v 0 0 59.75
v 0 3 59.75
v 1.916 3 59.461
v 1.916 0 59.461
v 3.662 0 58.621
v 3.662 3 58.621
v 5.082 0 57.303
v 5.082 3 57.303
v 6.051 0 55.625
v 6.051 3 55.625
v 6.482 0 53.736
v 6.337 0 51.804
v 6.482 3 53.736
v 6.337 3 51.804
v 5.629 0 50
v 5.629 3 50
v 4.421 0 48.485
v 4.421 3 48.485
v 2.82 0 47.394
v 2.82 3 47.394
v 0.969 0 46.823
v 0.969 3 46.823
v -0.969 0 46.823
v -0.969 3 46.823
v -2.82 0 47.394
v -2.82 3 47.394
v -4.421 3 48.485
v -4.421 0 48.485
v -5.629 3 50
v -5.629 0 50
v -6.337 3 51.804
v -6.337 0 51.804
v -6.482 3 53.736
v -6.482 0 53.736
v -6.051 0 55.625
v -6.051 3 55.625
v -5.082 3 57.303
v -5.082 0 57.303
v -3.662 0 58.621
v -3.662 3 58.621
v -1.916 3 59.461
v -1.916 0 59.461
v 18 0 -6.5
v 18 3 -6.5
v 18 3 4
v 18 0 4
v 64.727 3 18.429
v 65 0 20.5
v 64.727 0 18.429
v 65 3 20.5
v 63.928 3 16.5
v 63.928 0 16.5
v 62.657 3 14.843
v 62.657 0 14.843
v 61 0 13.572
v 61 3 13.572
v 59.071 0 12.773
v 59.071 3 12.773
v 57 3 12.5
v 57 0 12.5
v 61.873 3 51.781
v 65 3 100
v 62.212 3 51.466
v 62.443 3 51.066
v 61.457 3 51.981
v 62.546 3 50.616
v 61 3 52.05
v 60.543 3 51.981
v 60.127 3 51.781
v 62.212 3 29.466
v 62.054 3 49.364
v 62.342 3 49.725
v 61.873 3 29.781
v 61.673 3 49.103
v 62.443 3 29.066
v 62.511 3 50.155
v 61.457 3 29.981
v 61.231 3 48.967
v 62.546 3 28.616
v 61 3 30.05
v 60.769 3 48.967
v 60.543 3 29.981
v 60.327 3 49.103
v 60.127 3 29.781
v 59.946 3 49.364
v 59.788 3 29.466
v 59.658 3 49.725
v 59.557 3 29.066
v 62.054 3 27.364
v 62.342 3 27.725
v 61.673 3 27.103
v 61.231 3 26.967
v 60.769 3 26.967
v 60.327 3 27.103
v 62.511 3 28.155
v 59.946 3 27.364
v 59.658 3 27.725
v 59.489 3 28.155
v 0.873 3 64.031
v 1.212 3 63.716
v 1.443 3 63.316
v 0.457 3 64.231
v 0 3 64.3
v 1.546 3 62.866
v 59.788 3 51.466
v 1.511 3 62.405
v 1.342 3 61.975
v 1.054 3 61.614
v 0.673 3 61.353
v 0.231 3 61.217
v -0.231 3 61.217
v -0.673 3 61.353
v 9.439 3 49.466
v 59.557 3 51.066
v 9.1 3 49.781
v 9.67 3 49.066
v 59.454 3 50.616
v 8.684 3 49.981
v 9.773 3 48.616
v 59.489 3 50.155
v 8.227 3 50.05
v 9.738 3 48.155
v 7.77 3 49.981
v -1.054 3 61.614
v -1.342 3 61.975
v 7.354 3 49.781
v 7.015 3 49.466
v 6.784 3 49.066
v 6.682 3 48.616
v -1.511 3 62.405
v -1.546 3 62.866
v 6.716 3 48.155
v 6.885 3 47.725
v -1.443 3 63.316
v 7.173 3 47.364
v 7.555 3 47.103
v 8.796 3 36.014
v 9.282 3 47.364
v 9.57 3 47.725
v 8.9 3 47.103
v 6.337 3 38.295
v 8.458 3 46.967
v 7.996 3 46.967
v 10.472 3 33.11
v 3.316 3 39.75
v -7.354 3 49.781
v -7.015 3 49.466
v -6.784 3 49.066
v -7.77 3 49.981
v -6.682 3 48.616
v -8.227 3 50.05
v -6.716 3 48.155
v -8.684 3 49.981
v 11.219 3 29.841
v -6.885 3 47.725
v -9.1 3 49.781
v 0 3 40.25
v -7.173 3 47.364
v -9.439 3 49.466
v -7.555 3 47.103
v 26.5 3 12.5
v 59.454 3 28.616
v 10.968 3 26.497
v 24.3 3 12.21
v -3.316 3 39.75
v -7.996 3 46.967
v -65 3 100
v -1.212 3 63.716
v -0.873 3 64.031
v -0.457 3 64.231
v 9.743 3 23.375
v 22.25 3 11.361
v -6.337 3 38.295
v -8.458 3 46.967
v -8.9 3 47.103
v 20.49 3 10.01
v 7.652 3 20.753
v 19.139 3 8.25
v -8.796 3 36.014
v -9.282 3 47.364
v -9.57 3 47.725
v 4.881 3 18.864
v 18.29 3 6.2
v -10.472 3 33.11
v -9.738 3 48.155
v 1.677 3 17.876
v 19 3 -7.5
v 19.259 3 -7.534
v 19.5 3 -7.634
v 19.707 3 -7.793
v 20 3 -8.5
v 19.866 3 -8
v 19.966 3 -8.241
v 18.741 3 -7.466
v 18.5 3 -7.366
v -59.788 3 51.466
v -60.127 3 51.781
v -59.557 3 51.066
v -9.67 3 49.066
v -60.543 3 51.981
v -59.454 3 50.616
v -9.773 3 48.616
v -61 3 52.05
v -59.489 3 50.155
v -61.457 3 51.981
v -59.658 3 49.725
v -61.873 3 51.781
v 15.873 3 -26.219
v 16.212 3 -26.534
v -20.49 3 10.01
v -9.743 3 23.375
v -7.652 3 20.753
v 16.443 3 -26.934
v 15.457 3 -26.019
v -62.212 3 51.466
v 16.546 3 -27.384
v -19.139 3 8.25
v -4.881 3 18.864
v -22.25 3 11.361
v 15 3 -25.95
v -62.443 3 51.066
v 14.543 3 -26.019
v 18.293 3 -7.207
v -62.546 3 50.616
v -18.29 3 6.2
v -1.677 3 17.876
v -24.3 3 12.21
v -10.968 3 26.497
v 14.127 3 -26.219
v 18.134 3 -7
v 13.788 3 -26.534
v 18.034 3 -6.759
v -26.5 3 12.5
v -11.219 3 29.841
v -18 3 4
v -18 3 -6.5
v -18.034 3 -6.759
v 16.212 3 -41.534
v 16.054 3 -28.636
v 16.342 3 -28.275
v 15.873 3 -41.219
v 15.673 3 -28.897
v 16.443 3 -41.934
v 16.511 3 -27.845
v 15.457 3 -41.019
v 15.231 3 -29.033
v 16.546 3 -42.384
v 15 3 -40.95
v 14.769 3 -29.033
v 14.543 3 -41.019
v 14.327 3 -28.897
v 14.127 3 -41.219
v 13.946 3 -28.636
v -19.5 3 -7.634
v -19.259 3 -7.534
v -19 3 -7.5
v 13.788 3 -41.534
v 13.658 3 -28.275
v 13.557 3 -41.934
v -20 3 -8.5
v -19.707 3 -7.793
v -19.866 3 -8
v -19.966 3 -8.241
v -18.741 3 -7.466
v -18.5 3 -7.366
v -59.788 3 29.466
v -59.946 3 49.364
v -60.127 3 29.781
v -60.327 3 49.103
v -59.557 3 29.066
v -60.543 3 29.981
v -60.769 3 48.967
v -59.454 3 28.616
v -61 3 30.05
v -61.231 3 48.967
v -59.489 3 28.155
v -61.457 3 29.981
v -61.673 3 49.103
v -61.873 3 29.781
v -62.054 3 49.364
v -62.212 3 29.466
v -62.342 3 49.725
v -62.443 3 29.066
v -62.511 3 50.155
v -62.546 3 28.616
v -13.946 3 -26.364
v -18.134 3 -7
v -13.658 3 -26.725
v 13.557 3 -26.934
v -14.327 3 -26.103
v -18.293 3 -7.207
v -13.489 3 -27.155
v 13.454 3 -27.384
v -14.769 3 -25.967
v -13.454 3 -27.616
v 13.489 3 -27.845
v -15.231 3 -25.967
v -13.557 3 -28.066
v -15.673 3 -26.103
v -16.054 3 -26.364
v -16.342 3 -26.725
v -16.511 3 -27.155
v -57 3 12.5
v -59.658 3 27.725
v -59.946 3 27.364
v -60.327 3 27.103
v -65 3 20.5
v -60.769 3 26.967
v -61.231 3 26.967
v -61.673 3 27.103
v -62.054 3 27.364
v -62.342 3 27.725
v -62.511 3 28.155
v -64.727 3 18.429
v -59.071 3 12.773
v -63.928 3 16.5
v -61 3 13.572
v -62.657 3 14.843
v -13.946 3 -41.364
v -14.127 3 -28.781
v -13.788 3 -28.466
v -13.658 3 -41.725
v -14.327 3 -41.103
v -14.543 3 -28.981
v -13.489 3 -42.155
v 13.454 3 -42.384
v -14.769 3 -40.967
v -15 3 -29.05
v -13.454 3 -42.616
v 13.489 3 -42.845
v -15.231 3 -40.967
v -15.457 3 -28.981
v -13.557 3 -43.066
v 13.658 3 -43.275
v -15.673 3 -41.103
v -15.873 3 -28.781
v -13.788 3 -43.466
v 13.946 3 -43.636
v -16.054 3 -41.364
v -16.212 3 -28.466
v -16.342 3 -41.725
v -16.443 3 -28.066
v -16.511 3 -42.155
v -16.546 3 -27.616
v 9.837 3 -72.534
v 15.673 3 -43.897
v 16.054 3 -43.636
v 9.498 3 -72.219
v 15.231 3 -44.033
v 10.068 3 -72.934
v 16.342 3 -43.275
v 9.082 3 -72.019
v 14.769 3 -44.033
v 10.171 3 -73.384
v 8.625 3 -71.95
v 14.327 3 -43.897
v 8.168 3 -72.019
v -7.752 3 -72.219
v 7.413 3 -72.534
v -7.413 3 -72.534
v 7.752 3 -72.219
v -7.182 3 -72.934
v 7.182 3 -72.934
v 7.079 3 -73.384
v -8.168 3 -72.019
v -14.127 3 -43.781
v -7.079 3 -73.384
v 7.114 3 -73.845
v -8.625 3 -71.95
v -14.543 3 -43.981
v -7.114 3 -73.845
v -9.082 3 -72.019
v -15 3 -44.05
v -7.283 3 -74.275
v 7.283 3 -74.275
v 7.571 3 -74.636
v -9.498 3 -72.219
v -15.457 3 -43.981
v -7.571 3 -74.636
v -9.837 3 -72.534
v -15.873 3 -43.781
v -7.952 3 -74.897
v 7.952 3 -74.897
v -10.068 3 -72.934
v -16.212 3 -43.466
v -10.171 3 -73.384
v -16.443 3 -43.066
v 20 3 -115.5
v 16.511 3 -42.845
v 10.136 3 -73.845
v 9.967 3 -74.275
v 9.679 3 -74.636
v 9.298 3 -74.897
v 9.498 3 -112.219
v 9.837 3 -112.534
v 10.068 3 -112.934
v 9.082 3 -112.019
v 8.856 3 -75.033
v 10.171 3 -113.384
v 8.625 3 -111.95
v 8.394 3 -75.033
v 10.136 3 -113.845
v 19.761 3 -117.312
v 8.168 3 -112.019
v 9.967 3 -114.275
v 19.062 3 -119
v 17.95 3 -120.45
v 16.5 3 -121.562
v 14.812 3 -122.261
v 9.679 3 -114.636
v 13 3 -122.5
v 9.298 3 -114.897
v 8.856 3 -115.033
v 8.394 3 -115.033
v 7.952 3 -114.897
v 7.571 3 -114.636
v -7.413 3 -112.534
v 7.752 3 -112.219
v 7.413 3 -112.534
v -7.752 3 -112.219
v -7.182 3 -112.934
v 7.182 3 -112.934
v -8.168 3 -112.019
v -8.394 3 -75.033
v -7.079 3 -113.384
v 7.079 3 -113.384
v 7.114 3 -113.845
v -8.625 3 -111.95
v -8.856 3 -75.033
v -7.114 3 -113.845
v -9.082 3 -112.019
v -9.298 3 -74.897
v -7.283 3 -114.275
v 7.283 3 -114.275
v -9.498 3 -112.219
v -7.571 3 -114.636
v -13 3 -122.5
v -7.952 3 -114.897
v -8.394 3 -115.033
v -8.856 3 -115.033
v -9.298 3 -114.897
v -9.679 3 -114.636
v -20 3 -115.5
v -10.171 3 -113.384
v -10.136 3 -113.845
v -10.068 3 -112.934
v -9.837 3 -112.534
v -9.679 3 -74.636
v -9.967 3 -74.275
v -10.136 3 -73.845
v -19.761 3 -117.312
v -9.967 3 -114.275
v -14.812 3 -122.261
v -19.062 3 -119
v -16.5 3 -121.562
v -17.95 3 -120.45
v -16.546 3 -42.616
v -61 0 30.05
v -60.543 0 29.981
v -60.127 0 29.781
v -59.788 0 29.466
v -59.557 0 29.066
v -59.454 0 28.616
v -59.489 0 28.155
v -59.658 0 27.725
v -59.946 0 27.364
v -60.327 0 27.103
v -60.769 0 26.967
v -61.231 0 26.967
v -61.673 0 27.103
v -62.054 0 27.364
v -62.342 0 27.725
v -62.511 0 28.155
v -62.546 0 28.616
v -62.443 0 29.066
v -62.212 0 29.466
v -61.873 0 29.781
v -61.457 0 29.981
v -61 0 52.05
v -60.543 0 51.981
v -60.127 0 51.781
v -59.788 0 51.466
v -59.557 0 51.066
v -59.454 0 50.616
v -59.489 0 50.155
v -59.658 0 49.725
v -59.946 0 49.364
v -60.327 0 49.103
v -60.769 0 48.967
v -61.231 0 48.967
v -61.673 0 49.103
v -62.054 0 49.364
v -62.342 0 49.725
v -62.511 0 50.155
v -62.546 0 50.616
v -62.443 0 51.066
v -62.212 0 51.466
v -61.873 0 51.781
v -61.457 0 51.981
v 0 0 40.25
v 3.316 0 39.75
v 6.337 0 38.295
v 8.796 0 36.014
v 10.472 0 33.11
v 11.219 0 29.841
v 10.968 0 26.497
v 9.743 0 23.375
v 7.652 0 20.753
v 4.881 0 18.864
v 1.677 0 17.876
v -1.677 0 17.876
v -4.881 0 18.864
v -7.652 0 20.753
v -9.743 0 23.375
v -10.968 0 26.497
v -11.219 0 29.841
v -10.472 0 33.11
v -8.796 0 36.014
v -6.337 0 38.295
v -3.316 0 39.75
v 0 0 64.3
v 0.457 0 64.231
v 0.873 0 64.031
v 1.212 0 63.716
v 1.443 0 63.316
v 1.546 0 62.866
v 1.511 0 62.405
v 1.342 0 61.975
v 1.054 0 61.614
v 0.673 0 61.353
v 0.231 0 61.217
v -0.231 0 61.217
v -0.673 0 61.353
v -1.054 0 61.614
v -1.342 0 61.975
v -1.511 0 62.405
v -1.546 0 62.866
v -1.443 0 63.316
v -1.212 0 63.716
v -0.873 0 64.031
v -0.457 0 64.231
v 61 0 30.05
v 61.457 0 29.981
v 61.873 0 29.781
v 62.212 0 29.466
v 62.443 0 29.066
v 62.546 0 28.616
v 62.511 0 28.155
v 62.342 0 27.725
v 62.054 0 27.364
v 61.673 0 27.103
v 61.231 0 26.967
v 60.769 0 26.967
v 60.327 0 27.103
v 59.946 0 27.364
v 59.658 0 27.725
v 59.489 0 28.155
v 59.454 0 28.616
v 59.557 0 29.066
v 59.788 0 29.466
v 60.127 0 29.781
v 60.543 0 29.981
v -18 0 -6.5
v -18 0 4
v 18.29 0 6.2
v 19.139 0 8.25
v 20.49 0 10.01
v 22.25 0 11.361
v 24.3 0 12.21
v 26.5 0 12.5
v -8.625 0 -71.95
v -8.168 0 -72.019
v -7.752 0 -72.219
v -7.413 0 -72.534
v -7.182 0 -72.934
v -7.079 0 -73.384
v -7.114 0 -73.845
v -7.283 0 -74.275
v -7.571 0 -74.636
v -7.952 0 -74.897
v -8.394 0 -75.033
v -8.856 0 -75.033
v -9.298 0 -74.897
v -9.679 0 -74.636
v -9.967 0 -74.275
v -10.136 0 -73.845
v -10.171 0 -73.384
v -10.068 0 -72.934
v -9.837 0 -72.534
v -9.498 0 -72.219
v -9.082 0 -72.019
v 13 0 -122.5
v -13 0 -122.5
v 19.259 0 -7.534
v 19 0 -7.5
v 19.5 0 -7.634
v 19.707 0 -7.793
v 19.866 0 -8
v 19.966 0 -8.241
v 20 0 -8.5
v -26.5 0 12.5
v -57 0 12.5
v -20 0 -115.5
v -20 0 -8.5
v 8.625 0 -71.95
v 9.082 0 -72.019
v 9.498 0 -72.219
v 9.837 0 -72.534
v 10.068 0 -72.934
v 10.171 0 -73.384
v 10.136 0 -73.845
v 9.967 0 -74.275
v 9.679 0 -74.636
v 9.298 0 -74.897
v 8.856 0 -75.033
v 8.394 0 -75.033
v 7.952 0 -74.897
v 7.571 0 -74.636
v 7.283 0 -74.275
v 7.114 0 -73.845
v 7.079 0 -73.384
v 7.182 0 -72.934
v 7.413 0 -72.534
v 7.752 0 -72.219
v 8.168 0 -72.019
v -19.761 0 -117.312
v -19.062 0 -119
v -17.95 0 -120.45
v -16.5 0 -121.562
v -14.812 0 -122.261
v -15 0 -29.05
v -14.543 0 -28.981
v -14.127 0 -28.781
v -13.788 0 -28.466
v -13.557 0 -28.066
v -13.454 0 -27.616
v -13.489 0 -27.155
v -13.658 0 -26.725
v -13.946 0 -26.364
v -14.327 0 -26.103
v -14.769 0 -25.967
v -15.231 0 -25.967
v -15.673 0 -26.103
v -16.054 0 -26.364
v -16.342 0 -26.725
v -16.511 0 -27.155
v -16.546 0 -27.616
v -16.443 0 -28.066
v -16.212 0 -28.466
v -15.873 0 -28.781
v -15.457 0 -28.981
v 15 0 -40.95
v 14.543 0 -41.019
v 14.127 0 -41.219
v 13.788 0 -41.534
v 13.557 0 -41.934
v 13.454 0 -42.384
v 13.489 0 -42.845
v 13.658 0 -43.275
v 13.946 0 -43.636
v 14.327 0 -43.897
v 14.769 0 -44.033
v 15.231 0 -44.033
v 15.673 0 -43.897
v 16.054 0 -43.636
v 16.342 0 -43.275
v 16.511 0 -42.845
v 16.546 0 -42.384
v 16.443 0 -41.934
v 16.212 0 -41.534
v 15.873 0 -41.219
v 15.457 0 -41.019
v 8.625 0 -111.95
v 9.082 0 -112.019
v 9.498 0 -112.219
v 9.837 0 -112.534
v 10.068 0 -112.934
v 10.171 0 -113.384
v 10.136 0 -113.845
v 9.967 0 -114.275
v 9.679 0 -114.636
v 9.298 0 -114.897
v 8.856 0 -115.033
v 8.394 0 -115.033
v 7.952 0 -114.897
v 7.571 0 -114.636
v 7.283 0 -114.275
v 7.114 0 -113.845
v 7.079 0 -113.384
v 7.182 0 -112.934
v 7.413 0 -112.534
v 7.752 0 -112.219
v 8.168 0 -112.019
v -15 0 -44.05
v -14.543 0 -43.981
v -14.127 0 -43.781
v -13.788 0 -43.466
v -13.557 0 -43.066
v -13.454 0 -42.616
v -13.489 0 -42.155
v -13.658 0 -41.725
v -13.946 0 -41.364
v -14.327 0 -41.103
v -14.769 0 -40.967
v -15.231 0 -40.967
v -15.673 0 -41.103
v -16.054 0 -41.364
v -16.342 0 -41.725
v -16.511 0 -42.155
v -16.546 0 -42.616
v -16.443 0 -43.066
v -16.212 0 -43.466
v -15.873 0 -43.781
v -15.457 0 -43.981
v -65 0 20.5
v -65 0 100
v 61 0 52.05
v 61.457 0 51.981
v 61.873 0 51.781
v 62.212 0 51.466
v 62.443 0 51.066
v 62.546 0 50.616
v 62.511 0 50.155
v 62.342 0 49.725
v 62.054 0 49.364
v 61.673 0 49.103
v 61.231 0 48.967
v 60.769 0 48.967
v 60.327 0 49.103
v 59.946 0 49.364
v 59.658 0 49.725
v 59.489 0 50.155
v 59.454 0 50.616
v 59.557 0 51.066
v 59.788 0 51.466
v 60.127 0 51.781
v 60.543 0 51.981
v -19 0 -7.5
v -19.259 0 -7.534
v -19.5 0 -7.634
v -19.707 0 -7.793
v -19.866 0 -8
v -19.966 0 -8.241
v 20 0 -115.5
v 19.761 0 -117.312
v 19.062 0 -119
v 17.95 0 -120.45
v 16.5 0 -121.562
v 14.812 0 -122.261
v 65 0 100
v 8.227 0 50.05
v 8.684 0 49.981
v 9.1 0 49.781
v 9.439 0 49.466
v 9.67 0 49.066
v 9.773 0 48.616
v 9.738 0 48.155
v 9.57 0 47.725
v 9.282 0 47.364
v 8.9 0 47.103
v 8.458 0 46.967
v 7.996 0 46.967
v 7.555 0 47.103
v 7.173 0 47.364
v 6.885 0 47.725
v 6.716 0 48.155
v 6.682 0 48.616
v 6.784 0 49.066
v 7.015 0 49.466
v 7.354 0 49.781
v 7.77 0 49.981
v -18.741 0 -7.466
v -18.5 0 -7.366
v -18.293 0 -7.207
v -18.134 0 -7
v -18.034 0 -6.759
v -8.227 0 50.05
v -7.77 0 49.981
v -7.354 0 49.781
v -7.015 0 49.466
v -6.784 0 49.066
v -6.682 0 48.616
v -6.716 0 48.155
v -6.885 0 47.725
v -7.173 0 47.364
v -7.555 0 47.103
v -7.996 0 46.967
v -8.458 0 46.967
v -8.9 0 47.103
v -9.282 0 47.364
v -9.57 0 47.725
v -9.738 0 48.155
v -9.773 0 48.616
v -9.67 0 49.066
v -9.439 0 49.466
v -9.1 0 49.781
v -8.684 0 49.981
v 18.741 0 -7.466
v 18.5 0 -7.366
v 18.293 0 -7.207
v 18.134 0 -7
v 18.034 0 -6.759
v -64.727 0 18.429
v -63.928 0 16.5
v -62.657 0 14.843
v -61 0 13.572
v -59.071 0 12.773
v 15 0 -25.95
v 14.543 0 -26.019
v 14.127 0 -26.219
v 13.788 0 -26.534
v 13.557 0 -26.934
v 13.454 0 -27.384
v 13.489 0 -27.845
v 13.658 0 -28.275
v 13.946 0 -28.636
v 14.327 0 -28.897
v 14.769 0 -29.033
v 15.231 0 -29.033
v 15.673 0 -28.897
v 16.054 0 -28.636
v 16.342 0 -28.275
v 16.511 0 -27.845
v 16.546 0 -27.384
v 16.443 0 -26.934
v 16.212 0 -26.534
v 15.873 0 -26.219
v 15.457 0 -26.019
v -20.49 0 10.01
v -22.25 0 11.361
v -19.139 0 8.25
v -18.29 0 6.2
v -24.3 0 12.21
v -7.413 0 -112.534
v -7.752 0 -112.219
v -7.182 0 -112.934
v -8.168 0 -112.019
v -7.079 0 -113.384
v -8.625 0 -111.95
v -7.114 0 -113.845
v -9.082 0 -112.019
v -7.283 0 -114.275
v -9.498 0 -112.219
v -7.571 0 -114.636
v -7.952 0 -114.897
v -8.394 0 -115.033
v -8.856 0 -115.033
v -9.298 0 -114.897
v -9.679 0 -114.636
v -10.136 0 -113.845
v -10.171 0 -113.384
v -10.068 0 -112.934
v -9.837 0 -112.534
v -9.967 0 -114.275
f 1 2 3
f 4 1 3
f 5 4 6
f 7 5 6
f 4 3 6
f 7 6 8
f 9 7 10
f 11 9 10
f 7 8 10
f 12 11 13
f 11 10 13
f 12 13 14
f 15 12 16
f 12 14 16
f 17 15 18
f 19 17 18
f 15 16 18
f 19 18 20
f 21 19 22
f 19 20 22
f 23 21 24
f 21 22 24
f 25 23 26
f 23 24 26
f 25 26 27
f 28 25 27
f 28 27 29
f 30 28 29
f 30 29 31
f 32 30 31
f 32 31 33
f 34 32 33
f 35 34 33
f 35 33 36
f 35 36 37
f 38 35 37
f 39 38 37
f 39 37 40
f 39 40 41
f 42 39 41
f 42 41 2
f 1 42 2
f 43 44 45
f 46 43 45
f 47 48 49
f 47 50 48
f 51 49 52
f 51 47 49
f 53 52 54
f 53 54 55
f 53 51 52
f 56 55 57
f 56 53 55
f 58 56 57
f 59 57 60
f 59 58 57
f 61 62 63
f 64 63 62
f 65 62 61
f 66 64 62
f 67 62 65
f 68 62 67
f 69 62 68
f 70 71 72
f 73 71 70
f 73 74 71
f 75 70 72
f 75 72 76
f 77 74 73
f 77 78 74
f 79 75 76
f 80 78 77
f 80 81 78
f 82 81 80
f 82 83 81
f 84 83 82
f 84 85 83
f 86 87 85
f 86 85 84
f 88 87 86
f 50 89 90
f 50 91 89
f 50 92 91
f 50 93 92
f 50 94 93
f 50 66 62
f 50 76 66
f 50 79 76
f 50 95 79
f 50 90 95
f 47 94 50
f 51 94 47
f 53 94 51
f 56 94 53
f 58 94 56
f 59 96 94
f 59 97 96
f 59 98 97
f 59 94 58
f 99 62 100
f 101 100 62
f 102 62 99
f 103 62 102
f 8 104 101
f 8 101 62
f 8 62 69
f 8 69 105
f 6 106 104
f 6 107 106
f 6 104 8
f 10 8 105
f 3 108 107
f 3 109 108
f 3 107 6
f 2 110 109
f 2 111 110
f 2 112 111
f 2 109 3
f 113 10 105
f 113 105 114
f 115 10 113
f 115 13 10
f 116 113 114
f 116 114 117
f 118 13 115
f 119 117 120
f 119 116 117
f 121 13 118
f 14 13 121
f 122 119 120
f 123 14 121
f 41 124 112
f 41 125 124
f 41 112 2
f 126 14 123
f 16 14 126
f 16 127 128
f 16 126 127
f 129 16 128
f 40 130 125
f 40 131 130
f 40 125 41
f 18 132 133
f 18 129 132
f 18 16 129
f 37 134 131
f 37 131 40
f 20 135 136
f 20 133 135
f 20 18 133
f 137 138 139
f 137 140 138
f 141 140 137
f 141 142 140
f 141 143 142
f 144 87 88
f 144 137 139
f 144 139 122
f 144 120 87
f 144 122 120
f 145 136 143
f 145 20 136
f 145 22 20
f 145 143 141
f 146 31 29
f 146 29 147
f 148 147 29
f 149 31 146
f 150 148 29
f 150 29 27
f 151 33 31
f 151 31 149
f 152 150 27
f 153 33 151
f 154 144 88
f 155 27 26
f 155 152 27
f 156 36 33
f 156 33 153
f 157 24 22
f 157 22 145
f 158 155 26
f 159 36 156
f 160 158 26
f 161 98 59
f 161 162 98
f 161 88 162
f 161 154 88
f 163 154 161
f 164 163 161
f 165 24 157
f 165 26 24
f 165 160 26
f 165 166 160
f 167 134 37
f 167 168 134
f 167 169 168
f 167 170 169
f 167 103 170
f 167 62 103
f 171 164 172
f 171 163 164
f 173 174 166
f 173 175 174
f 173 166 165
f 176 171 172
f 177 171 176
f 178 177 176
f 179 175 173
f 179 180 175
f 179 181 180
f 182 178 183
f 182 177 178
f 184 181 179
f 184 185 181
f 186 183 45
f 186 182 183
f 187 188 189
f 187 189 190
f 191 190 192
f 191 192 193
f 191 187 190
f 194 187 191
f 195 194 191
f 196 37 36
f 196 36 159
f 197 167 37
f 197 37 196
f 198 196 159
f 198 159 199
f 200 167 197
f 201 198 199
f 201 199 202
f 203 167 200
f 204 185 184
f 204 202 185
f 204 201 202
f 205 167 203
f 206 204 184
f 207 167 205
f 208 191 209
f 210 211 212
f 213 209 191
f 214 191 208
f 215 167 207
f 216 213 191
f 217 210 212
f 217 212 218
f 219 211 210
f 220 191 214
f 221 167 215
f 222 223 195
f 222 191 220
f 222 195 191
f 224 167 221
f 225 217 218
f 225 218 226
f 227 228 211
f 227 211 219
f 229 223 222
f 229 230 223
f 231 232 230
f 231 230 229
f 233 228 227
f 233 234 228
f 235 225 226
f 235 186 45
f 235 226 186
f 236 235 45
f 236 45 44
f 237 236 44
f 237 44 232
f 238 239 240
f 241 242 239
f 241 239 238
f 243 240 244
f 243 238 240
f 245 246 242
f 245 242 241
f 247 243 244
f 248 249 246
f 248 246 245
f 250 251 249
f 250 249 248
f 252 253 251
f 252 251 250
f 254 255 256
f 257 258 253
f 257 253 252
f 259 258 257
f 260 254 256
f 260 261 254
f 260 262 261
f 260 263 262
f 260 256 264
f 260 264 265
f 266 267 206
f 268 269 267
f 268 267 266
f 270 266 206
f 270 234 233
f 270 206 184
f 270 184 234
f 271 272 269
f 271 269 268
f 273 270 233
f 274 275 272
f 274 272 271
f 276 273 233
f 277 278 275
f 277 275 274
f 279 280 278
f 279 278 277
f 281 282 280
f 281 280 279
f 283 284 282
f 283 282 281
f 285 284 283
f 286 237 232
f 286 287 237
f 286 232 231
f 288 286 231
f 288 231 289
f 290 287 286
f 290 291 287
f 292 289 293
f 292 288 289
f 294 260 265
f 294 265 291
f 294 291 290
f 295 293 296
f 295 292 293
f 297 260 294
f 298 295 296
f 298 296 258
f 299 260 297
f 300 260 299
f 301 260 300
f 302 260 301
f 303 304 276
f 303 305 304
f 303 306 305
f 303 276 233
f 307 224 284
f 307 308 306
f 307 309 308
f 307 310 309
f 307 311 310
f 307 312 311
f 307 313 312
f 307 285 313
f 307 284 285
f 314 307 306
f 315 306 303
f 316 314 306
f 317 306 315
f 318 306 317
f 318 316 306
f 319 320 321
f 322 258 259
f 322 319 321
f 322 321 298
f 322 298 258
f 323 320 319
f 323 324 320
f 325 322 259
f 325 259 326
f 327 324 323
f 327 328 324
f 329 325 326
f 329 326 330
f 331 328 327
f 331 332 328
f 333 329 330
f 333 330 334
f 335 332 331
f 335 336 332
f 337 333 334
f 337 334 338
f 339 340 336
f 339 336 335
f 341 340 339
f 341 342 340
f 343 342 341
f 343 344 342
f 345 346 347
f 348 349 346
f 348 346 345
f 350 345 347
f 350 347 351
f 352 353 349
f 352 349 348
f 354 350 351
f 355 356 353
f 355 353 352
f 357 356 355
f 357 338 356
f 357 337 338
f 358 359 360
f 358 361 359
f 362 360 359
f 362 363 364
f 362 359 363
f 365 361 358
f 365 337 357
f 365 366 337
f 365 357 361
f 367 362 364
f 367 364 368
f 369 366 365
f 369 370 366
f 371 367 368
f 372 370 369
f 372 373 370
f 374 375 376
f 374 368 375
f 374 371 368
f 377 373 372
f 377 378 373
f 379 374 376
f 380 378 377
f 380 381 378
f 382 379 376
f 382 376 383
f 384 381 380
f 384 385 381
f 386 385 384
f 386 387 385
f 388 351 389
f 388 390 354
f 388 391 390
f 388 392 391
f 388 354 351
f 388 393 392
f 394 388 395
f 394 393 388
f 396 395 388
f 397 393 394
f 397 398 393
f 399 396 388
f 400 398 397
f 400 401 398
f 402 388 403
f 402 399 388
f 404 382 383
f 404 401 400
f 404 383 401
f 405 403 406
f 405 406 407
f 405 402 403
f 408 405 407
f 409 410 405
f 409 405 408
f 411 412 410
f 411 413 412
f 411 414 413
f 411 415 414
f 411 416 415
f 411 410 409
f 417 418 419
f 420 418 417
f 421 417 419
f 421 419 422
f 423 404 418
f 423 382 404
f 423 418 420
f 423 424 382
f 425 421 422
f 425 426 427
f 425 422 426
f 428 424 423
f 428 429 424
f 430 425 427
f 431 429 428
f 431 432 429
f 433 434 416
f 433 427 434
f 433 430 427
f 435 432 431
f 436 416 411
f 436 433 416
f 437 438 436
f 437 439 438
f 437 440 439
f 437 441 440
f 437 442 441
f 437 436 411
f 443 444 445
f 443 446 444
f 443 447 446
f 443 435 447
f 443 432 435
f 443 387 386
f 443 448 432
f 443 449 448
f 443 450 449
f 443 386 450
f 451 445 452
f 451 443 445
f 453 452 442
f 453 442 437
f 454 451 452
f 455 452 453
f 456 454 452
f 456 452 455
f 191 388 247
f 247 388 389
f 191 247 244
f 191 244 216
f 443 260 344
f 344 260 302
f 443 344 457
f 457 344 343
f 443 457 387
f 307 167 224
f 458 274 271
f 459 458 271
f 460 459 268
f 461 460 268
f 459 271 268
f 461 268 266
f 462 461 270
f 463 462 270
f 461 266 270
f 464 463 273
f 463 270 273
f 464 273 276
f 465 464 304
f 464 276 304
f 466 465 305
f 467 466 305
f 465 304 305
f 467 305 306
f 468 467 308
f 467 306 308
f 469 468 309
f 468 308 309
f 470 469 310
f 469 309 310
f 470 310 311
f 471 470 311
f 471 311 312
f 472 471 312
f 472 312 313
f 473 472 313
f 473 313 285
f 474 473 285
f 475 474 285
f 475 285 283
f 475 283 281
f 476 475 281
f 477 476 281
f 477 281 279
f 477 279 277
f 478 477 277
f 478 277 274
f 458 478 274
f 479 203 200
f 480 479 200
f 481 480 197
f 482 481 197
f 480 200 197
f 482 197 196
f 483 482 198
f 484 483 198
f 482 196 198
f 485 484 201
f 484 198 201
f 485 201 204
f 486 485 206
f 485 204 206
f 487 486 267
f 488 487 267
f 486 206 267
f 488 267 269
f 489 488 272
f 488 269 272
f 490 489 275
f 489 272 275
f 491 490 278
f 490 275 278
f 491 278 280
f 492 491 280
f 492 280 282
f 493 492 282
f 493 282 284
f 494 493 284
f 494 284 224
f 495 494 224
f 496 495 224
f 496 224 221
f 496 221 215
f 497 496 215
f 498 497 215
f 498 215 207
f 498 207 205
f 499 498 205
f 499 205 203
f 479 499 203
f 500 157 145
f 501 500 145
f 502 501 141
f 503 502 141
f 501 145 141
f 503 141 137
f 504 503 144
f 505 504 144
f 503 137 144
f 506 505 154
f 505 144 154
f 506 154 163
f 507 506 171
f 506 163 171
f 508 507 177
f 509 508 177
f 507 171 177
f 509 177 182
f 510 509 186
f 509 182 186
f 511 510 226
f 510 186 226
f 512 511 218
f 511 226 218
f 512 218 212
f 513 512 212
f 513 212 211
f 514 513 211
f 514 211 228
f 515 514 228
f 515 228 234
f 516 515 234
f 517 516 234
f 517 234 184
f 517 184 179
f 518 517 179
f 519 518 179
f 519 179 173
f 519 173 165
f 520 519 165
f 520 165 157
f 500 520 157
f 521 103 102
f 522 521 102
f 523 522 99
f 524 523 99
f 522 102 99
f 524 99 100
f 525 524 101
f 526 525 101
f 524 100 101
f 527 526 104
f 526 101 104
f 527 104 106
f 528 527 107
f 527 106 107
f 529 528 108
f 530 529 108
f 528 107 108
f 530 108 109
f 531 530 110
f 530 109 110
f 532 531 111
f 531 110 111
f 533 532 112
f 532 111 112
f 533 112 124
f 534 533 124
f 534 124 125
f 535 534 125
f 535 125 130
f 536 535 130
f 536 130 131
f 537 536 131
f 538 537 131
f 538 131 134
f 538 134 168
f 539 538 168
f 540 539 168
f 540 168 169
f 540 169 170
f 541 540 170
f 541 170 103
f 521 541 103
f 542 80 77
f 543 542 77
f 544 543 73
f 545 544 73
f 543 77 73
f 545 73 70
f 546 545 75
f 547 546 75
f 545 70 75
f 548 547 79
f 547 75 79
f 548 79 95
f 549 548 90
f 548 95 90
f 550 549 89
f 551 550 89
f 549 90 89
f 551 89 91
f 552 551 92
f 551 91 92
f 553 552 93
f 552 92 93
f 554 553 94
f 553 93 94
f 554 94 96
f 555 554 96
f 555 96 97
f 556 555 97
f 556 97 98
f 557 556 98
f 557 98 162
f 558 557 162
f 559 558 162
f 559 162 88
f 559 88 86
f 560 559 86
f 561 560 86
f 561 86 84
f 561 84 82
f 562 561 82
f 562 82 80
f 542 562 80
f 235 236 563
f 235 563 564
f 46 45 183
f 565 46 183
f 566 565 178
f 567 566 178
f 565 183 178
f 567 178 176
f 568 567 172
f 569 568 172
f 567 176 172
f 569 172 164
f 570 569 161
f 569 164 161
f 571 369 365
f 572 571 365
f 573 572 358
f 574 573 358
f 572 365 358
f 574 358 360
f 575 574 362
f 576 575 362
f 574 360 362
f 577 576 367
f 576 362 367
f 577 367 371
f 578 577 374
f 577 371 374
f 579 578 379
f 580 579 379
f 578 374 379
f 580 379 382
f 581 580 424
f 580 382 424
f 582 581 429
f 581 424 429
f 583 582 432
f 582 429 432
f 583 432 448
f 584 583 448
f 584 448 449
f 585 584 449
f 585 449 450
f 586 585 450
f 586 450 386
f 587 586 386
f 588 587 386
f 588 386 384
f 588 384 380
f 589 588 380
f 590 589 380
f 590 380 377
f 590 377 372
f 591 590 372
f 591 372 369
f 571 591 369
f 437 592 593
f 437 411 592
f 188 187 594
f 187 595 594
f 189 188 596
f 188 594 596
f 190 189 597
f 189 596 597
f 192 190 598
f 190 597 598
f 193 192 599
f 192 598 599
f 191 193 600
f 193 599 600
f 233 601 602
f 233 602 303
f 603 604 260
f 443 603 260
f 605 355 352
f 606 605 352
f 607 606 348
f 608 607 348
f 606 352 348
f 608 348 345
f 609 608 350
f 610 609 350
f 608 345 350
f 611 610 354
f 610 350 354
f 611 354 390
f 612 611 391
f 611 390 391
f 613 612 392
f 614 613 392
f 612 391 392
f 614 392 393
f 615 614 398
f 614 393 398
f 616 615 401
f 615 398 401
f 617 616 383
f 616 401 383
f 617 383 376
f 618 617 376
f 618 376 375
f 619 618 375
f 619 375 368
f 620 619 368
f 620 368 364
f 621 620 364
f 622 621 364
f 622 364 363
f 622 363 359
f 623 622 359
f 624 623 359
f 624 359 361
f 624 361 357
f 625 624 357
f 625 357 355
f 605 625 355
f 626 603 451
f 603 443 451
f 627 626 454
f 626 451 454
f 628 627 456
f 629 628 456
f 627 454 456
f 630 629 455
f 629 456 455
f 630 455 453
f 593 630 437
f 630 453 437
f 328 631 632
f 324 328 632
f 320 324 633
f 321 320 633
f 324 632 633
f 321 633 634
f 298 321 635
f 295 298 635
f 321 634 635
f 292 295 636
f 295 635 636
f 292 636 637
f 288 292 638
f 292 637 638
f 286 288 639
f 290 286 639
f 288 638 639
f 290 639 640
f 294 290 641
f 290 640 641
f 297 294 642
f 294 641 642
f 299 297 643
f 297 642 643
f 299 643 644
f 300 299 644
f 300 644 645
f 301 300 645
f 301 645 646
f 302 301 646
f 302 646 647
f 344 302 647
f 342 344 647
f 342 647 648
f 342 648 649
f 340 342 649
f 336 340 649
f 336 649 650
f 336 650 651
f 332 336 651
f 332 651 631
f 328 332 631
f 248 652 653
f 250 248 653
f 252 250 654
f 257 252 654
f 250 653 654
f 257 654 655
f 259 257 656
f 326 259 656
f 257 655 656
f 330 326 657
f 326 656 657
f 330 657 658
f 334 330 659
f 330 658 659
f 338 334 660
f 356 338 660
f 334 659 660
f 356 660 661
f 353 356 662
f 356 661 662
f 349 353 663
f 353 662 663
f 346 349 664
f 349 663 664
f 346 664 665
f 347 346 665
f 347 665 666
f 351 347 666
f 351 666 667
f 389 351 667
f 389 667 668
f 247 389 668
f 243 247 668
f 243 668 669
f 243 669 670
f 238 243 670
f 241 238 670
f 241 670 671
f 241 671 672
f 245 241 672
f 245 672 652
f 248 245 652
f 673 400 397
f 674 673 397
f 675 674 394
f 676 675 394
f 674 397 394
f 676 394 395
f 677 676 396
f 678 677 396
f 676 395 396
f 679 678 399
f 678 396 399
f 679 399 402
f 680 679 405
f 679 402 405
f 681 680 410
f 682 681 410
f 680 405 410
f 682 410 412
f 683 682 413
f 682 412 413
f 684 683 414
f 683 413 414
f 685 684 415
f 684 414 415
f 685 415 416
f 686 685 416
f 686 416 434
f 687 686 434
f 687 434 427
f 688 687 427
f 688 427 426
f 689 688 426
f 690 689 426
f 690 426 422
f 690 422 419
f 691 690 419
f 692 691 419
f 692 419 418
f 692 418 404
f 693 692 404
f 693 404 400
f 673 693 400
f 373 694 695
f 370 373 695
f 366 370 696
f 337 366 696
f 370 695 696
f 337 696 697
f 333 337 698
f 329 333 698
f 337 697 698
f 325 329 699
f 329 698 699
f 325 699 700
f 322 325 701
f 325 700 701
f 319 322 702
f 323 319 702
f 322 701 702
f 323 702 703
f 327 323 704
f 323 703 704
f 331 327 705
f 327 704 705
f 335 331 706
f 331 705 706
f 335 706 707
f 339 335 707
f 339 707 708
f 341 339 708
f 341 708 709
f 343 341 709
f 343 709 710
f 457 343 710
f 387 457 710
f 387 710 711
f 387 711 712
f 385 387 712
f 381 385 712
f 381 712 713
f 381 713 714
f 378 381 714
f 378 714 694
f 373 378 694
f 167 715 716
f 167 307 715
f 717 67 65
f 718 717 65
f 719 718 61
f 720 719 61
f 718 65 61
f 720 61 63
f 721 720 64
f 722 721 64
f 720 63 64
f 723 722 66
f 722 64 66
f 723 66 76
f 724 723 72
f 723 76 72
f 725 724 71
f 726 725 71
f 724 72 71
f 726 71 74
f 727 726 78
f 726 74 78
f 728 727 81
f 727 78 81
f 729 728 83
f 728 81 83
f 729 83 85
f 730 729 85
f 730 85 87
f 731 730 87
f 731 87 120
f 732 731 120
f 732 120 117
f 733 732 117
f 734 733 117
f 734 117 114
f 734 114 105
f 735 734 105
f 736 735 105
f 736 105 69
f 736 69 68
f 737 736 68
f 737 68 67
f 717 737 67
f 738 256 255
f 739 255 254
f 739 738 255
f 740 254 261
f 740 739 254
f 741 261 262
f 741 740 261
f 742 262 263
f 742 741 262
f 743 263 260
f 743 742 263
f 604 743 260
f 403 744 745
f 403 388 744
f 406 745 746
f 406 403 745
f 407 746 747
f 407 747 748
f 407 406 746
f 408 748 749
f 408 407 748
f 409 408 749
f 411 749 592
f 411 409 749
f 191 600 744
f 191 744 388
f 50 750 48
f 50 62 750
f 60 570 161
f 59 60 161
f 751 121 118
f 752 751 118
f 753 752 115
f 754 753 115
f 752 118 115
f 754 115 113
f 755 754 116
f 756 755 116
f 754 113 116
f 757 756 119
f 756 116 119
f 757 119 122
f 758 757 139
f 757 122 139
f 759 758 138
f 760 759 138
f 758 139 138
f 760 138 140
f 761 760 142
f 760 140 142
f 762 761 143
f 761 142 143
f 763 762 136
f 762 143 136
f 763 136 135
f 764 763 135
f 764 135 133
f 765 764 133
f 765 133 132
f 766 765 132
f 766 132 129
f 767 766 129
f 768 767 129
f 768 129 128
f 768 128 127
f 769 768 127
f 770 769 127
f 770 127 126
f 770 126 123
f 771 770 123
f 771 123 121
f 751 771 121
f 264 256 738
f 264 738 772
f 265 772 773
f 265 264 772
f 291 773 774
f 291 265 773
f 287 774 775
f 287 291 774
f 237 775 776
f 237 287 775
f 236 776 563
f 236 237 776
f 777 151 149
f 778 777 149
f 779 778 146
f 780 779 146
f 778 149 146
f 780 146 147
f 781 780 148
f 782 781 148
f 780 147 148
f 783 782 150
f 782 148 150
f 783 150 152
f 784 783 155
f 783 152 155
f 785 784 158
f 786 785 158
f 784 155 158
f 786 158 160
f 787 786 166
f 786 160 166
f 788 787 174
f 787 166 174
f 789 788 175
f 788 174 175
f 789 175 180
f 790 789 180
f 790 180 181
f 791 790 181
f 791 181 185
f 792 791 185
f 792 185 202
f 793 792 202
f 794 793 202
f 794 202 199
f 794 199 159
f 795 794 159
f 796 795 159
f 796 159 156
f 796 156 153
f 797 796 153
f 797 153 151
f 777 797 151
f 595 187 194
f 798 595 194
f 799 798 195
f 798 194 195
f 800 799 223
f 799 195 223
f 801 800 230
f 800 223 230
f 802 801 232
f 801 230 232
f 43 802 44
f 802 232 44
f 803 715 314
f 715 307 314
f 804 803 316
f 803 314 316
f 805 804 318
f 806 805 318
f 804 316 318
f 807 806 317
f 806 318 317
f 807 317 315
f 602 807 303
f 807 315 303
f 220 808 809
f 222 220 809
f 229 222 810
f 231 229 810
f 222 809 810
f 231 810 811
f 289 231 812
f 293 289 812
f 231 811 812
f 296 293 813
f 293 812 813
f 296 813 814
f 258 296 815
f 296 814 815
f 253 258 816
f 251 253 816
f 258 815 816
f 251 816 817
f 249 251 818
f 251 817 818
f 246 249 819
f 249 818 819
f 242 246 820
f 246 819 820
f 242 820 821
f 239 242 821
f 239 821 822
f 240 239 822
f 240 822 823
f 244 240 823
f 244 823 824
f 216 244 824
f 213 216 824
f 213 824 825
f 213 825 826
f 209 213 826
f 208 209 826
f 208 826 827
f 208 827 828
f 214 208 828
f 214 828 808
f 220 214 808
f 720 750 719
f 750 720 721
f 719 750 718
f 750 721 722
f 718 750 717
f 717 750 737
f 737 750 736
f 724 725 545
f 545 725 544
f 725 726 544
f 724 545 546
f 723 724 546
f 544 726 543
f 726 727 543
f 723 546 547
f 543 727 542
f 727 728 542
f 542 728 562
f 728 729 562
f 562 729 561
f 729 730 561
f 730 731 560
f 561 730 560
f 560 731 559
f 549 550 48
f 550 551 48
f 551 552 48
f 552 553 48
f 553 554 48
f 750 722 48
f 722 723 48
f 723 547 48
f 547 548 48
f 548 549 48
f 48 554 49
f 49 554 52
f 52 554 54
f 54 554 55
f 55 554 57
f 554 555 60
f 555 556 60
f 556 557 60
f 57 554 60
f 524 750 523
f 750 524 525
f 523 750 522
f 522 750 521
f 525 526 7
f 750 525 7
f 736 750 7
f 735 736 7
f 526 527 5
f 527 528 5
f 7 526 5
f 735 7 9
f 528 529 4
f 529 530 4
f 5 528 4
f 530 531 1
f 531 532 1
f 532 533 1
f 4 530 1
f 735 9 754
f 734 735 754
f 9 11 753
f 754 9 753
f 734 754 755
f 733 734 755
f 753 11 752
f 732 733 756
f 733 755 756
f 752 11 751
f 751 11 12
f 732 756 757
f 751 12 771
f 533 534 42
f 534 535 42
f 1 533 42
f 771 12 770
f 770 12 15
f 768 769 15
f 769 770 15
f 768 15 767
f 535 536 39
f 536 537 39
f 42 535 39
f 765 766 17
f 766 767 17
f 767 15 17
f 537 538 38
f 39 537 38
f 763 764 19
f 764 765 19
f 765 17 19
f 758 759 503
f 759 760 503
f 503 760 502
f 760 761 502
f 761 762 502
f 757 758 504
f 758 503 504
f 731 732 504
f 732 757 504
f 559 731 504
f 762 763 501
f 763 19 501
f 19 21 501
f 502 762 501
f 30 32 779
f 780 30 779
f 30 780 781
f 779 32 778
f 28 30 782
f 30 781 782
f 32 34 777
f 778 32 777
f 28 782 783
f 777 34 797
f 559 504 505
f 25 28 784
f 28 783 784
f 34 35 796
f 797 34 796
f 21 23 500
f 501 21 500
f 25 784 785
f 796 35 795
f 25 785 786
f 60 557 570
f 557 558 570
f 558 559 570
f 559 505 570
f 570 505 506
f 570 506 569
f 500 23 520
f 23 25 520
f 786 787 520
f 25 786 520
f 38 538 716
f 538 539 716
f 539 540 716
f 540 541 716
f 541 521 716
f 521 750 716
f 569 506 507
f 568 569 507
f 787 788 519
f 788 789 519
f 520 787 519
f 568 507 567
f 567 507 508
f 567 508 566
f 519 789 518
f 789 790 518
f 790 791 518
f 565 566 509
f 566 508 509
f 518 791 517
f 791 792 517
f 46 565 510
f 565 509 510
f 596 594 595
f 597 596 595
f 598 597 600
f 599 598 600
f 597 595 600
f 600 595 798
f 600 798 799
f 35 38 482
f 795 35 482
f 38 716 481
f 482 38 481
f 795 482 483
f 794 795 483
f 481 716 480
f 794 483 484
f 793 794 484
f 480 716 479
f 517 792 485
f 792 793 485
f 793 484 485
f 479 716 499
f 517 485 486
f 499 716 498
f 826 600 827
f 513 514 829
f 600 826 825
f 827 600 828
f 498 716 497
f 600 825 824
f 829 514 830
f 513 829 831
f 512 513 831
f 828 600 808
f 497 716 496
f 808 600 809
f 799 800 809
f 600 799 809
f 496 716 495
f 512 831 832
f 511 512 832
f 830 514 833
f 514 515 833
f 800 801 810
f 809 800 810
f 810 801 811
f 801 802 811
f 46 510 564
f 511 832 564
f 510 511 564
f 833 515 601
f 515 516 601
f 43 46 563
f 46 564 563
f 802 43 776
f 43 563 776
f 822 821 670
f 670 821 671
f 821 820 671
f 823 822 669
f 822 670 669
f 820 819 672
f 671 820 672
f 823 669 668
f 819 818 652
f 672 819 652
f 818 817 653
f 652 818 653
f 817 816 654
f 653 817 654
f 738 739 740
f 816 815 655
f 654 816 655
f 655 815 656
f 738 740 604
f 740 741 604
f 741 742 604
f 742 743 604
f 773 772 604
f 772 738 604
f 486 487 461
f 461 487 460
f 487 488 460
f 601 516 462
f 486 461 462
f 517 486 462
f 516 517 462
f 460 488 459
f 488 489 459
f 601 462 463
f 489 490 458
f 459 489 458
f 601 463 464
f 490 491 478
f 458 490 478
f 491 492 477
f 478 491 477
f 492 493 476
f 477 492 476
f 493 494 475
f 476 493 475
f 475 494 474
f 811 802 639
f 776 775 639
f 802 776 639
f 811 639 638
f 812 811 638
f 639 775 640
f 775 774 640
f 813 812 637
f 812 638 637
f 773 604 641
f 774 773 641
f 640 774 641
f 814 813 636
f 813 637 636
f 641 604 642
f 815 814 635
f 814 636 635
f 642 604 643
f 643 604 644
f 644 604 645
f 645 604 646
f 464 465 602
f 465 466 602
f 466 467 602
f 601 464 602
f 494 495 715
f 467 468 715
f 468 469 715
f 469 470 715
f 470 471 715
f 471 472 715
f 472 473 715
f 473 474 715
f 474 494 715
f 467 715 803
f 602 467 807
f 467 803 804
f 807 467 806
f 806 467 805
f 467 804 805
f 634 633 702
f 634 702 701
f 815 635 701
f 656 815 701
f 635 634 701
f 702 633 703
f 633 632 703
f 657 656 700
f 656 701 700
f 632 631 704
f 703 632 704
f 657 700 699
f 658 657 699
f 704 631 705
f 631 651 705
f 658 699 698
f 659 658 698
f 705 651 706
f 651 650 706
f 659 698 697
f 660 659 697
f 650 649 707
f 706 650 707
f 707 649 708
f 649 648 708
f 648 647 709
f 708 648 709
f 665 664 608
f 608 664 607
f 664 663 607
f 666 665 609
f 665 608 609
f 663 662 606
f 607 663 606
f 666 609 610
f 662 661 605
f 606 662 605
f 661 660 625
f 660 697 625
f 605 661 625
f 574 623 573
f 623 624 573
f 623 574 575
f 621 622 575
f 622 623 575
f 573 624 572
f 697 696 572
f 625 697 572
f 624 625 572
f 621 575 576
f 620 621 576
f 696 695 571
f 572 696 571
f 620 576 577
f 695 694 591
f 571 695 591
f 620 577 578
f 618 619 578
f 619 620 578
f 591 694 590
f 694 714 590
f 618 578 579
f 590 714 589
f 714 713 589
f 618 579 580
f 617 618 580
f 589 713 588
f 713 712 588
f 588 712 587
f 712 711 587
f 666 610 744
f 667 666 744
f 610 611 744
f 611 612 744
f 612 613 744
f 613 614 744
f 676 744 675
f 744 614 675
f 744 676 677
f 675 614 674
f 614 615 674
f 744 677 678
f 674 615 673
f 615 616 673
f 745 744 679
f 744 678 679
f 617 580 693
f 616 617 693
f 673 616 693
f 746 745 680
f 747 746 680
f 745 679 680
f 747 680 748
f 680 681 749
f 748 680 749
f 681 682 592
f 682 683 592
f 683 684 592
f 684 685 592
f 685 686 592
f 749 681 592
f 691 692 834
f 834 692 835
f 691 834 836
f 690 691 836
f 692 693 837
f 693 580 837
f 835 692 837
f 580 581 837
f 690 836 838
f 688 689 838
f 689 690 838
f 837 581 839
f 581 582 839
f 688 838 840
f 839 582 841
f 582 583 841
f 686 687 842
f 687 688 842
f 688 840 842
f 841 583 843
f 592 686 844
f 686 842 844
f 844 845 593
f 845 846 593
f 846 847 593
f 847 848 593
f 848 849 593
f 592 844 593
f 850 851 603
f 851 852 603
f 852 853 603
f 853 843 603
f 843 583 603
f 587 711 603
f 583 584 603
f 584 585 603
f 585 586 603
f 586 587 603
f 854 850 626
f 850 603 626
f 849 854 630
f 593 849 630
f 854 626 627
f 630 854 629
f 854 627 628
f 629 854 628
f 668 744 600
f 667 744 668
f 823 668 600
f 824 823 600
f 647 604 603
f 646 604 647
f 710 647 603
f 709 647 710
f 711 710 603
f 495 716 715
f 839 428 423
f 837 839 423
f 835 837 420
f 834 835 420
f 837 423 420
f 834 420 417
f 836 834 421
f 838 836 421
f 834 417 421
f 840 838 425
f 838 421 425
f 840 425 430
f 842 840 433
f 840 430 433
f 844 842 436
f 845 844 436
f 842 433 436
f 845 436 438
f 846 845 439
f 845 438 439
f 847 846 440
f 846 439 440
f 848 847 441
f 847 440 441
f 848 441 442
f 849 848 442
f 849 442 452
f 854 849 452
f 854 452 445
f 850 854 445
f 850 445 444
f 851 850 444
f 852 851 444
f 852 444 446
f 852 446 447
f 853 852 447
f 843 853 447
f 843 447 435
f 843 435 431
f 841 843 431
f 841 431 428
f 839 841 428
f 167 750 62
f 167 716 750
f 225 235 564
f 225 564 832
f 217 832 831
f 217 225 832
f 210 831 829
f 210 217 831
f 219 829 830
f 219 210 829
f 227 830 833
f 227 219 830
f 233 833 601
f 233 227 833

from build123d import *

# Parameters (mm, degrees)
SKETCH_1_W              = 200
SKETCH_1_H              = 200
EXTRUDE_1_DEPTH         = 3
SKETCH_2_R              = 1.5
CUT_EXTRUDE_2_DEPTH     = 10
CUT_EXTRUDE_3_DEPTH     = 10
SKETCH_6_R              = 1.55
CUT_EXTRUDE_3_1_1_DEPTH = 10
CUT_EXTRUDE_6_REACH     = 111.495
SKETCH_11_R             = 1.5
CUT_EXTRUDE_22_5_REACH  = 111.495
SKETCH_4_R              = 11.25
FILLET_1_R              = 1
SKETCH_12_W             = 40
SKETCH_12_H             = 3
EXTRUDE_2_DEPTH         = 75
FILLET_2_R              = 7
SKETCH_13_R             = 1.55
CUT_EXTRUDE_3_1_DEPTH   = 10
SKETCH_16_R             = 1.55
SKETCH_16_R_2           = 6.5
CUT_EXTRUDE_6242_DEPTH  = 10
SKETCH_18_W             = 87.5
SKETCH_18_H             = 3
EXTRUDE_3_DEPTH         = 20.5
SKETCH_19_W             = 87.5
SKETCH_19_H             = 3
EXTRUDE_4_DEPTH         = 20.5
SKETCH_7_R              = 1.55
CUT_EXTRUDE_7_DEPTH     = 20.5
FILLET_3_R              = 8


with BuildPart() as part:
    # 草图1 → 凸台-拉伸1 (new body)
    with BuildSketch(Plane(origin=(0, 0, 0), x_dir=(1, 0, 0), z_dir=(0, 1, 0))):
        Rectangle(SKETCH_1_W, SKETCH_1_H)
    extrude(amount=EXTRUDE_1_DEPTH)

    # 草图2 → 切除-拉伸2 (cut)
    with BuildSketch(Plane(origin=(0, 3, 0), x_dir=(1, 0, 0), z_dir=(0, 1, 0))):
        with Locations(Location((29.5, 9.5, 0), (0, 0, 270))):
            Circle(SKETCH_2_R)
        with Locations(Location((21.5, 0, 0), (0, 0, 270))):
            Circle(SKETCH_2_R)
        with Locations(Location((29.5, -9.5, 0), (0, 0, 270))):
            Circle(SKETCH_2_R)
        with Locations(Location((37.5, 0, 0), (0, 0, 270))):
            Circle(SKETCH_2_R)
        with Locations(Location((-29.5, -9.5, 0), (0, 0, 270))):
            Circle(SKETCH_2_R)
        with Locations(Location((-37.5, 0, 0), (0, 0, 270))):
            Circle(SKETCH_2_R)
        with Locations(Location((-21.5, 0, 0), (0, 0, 270))):
            Circle(SKETCH_2_R)
        with Locations(Location((-29.5, 9.5, 0), (0, 0, 270))):
            Circle(SKETCH_2_R)
    extrude(amount=-CUT_EXTRUDE_2_DEPTH, mode=Mode.SUBTRACT)

    # 草图5 → 切除-拉伸3 (cut)
    with BuildSketch(Plane(origin=(0, 3, 0), x_dir=(1, 0, 0), z_dir=(0, 1, 0))):
        with BuildLine():
            Line((-100, -100), (-44.5, -100))
            Line((-44.5, -100), (-44.5, 0))
            ThreePointArc((-44.5, 0), (-40.212142643, 10.5), (-29.8, 14.9969997))
            ThreePointArc((-29.8, 14.9969997), (-22.858571571, 17.9949995), (-20, 24.9949995))
            Line((-20, 24.9949995), (-20, 47.5))
            Line((-20, 47.5), (0, 47.5))
            Line((0, 47.5), (20, 47.5))
            Line((20, 47.5), (20, 24.9949995))
            ThreePointArc((20, 24.9949995), (22.858571571, 17.9949995), (29.8, 14.9969997))
            ThreePointArc((29.8, 14.9969997), (40.212142643, 10.5), (44.5, 0))
            Line((44.5, 0), (44.5, -100))
            Line((44.5, -100), (100, -100))
            Line((100, -100), (100, 100))
            Line((100, 100), (-100, 100))
            Line((-100, 100), (-100, -100))
        make_face()
    extrude(amount=-CUT_EXTRUDE_3_DEPTH, mode=Mode.SUBTRACT)

    # 草图6 → φ3.1通孔1 (cut)
    with BuildSketch(Plane.XZ):
        with Locations(Location((-15, -42.5, 0), (0, 0, 270))):
            Circle(SKETCH_6_R)
        with Locations(Location((-15, -27.5, 0), (0, 0, 270))):
            Circle(SKETCH_6_R)
        with Locations(Location((15, -27.5, 0), (0, 0, 90))):
            Circle(SKETCH_6_R)
        with Locations(Location((15, -42.5, 0), (0, 0, 90))):
            Circle(SKETCH_6_R)
    extrude(amount=-CUT_EXTRUDE_3_1_1_DEPTH, mode=Mode.SUBTRACT)

    # 草图11 → 切除-拉伸6 (cut, up to next)
    with BuildSketch(Plane(origin=(0, 3, 0), x_dir=(1, 0, 0), z_dir=(0, 1, 0)), mode=Mode.PRIVATE) as cut_extrude_6_sk1:
        with BuildLine():
            Line((44.5, -17.5), (44.5, -100))
            Line((44.5, -100), (101.133062566, -100))
            Line((101.133062566, -100), (101.133062566, 47.5))
            Line((101.133062566, 47.5), (20, 47.5))
            Line((20, 47.5), (20, 7.5))
            Line((20, 7.5), (19, 7.5))
            ThreePointArc((19, 7.5), (18.292893219, 7.207106781), (18, 6.5))
            Line((18, 6.5), (18, -4))
            ThreePointArc((18, -4), (20.48959236, -10.01040764), (26.5, -12.5))
            Line((26.5, -12.5), (39.5, -12.5))
            Line((39.5, -12.5), (44.5, -12.5))
            Line((44.5, -12.5), (44.5, -17.5))
        make_face()
        with Locations((29.5, -9.5)):
            Circle(SKETCH_11_R, mode=Mode.SUBTRACT)
        with Locations((21.5, 0)):
            Circle(SKETCH_11_R, mode=Mode.SUBTRACT)
    cut_extrude_6_tool1 = extrude(cut_extrude_6_sk1.sketch, amount=-CUT_EXTRUDE_6_REACH, mode=Mode.PRIVATE) & part.part
    # 草图11 → 切除-拉伸6 (cut, up to next)
    with BuildSketch(Plane(origin=(0, 3, 0), x_dir=(1, 0, 0), z_dir=(0, 1, 0)), mode=Mode.PRIVATE) as cut_extrude_6_sk2:
        with BuildLine():
            Line((-44.5, -17.5), (-44.5, -100))
            Line((-44.5, -100), (-101.133062566, -100))
            Line((-101.133062566, -100), (-101.133062566, 47.5))
            Line((-101.133062566, 47.5), (-20, 47.5))
            Line((-20, 47.5), (-20, 7.5))
            Line((-20, 7.5), (-19, 7.5))
            ThreePointArc((-19, 7.5), (-18.292893219, 7.207106781), (-18, 6.5))
            Line((-18, 6.5), (-18, -4))
            ThreePointArc((-18, -4), (-20.48959236, -10.01040764), (-26.5, -12.5))
            Line((-26.5, -12.5), (-39.5, -12.5))
            Line((-39.5, -12.5), (-44.5, -12.5))
            Line((-44.5, -12.5), (-44.5, -17.5))
        make_face()
    cut_extrude_6_tool2 = extrude(cut_extrude_6_sk2.sketch, amount=-CUT_EXTRUDE_6_REACH, mode=Mode.PRIVATE) & part.part
    add(cut_extrude_6_tool1.solids().sort_by_distance((66.686037, 3, 19.669577))[0], mode=Mode.SUBTRACT)
    add(cut_extrude_6_tool2.solids().sort_by_distance((-66.626911, 3, 19.648158))[0], mode=Mode.SUBTRACT)

    # 草图4 → φ22.5落弹孔 (cut, up to next)
    with BuildSketch(Plane(origin=(0, 3, 0), x_dir=(1, 0, 0), z_dir=(0, 1, 0)), mode=Mode.PRIVATE) as cut_extrude_22_5_sk1:
        with Locations(Location((0, -29, 0), (0, 0, 270))):
            Circle(SKETCH_4_R)
    cut_extrude_22_5_tool1 = extrude(cut_extrude_22_5_sk1.sketch, amount=-CUT_EXTRUDE_22_5_REACH, mode=Mode.PRIVATE) & part.part
    add(cut_extrude_22_5_tool1.solids().sort_by_distance((0, 3, 29))[0], mode=Mode.SUBTRACT)

    # 圆角1
    fillet_1_edges = [part.edges().sort_by_distance(p)[0] for p in [
        (-20, 1.5, -7.5),
        (20, 1.5, -7.5),
    ]]
    fillet(fillet_1_edges, radius=FILLET_1_R - 0.0001)  # a hair under: the kernel refuses the full size

    # 草图12 → 凸台-拉伸2 (add)
    with BuildSketch(Plane(origin=(0, 0, -47.5), x_dir=(-1, 0, 0), z_dir=(0, 0, -1))):
        with Locations((0, 1.5)):
            Rectangle(SKETCH_12_W, SKETCH_12_H)
    extrude(amount=EXTRUDE_2_DEPTH)

    # 圆角2
    fillet_2_edges = [part.edges().sort_by_distance(p)[0] for p in [
        (20, 1.5, -122.5),
        (-20, 1.5, -122.5),
    ]]
    fillet(fillet_2_edges, radius=FILLET_2_R)

    # 草图13 → φ3.1通孔 (cut)
    with BuildSketch(Plane(origin=(0, 3, 0), x_dir=(1, 0, 0), z_dir=(0, 1, 0))):
        with Locations(Location((-8.625, 113.5, 0), (0, 0, 270))):
            Circle(SKETCH_13_R)
        with Locations(Location((8.625, 113.5, 0), (0, 0, 270))):
            Circle(SKETCH_13_R)
        with Locations(Location((8.625, 73.5, 0), (0, 0, 270))):
            Circle(SKETCH_13_R)
        with Locations(Location((-8.625, 73.5, 0), (0, 0, 270))):
            Circle(SKETCH_13_R)
    extrude(amount=-CUT_EXTRUDE_3_1_DEPTH, mode=Mode.SUBTRACT)

    # 草图16 → Cut-Extrude 6242 (cut)
    with BuildSketch(Plane(origin=(0, 3, 0), x_dir=(1, 0, 0), z_dir=(0, 1, 0))):
        with Locations(Location((0, -62.75, 0), (0, 0, 270))):
            Circle(SKETCH_16_R)
        with Locations(Location((-8.227241336, -48.5, 0), (0, 0, 270))):
            Circle(SKETCH_16_R)
        with Locations(Location((8.227241336, -48.5, 0), (0, 0, 270))):
            Circle(SKETCH_16_R)
        with Locations(Location((0, -53.25, 0), (0, 0, 270))):
            Circle(SKETCH_16_R_2)
    extrude(amount=-CUT_EXTRUDE_6242_DEPTH, mode=Mode.SUBTRACT)

    # 草图18 → 凸台-拉伸3 (add)
    with BuildSketch(Plane.ZY.offset(44.5)):
        with Locations((56.25, 1.5)):
            Rectangle(SKETCH_18_W, SKETCH_18_H)
    extrude(amount=EXTRUDE_3_DEPTH)

    # 草图19 → 凸台-拉伸4 (add)
    with BuildSketch(Plane(origin=(44.5, 0, 0), x_dir=(0, 0, -1), z_dir=(1, 0, 0))):
        with Locations((-56.25, 1.5)):
            Rectangle(SKETCH_19_W, SKETCH_19_H)
    extrude(amount=EXTRUDE_4_DEPTH)

    # 草图7 → 切除-拉伸7 (cut)
    with BuildSketch(Plane(origin=(0, 3, 0), x_dir=(1, 0, 0), z_dir=(0, 1, 0))):
        with Locations(Location((-61, -28.5, 0), (0, 0, 270))):
            Circle(SKETCH_7_R)
        with Locations(Location((-61, -50.5, 0), (0, 0, 270))):
            Circle(SKETCH_7_R)
        with Locations(Location((61, -28.5, 0), (0, 0, 270))):
            Circle(SKETCH_7_R)
        with Locations(Location((61, -50.5, 0), (0, 0, 270))):
            Circle(SKETCH_7_R)
    extrude(amount=-CUT_EXTRUDE_7_DEPTH, mode=Mode.SUBTRACT)

    # 圆角3
    fillet_3_edges = [part.edges().sort_by_distance(p)[0] for p in [
        (-65, 1.5, 12.5),
        (65, 1.5, 12.5),
    ]]
    fillet(fillet_3_edges, radius=FILLET_3_R)


solid = part.part
